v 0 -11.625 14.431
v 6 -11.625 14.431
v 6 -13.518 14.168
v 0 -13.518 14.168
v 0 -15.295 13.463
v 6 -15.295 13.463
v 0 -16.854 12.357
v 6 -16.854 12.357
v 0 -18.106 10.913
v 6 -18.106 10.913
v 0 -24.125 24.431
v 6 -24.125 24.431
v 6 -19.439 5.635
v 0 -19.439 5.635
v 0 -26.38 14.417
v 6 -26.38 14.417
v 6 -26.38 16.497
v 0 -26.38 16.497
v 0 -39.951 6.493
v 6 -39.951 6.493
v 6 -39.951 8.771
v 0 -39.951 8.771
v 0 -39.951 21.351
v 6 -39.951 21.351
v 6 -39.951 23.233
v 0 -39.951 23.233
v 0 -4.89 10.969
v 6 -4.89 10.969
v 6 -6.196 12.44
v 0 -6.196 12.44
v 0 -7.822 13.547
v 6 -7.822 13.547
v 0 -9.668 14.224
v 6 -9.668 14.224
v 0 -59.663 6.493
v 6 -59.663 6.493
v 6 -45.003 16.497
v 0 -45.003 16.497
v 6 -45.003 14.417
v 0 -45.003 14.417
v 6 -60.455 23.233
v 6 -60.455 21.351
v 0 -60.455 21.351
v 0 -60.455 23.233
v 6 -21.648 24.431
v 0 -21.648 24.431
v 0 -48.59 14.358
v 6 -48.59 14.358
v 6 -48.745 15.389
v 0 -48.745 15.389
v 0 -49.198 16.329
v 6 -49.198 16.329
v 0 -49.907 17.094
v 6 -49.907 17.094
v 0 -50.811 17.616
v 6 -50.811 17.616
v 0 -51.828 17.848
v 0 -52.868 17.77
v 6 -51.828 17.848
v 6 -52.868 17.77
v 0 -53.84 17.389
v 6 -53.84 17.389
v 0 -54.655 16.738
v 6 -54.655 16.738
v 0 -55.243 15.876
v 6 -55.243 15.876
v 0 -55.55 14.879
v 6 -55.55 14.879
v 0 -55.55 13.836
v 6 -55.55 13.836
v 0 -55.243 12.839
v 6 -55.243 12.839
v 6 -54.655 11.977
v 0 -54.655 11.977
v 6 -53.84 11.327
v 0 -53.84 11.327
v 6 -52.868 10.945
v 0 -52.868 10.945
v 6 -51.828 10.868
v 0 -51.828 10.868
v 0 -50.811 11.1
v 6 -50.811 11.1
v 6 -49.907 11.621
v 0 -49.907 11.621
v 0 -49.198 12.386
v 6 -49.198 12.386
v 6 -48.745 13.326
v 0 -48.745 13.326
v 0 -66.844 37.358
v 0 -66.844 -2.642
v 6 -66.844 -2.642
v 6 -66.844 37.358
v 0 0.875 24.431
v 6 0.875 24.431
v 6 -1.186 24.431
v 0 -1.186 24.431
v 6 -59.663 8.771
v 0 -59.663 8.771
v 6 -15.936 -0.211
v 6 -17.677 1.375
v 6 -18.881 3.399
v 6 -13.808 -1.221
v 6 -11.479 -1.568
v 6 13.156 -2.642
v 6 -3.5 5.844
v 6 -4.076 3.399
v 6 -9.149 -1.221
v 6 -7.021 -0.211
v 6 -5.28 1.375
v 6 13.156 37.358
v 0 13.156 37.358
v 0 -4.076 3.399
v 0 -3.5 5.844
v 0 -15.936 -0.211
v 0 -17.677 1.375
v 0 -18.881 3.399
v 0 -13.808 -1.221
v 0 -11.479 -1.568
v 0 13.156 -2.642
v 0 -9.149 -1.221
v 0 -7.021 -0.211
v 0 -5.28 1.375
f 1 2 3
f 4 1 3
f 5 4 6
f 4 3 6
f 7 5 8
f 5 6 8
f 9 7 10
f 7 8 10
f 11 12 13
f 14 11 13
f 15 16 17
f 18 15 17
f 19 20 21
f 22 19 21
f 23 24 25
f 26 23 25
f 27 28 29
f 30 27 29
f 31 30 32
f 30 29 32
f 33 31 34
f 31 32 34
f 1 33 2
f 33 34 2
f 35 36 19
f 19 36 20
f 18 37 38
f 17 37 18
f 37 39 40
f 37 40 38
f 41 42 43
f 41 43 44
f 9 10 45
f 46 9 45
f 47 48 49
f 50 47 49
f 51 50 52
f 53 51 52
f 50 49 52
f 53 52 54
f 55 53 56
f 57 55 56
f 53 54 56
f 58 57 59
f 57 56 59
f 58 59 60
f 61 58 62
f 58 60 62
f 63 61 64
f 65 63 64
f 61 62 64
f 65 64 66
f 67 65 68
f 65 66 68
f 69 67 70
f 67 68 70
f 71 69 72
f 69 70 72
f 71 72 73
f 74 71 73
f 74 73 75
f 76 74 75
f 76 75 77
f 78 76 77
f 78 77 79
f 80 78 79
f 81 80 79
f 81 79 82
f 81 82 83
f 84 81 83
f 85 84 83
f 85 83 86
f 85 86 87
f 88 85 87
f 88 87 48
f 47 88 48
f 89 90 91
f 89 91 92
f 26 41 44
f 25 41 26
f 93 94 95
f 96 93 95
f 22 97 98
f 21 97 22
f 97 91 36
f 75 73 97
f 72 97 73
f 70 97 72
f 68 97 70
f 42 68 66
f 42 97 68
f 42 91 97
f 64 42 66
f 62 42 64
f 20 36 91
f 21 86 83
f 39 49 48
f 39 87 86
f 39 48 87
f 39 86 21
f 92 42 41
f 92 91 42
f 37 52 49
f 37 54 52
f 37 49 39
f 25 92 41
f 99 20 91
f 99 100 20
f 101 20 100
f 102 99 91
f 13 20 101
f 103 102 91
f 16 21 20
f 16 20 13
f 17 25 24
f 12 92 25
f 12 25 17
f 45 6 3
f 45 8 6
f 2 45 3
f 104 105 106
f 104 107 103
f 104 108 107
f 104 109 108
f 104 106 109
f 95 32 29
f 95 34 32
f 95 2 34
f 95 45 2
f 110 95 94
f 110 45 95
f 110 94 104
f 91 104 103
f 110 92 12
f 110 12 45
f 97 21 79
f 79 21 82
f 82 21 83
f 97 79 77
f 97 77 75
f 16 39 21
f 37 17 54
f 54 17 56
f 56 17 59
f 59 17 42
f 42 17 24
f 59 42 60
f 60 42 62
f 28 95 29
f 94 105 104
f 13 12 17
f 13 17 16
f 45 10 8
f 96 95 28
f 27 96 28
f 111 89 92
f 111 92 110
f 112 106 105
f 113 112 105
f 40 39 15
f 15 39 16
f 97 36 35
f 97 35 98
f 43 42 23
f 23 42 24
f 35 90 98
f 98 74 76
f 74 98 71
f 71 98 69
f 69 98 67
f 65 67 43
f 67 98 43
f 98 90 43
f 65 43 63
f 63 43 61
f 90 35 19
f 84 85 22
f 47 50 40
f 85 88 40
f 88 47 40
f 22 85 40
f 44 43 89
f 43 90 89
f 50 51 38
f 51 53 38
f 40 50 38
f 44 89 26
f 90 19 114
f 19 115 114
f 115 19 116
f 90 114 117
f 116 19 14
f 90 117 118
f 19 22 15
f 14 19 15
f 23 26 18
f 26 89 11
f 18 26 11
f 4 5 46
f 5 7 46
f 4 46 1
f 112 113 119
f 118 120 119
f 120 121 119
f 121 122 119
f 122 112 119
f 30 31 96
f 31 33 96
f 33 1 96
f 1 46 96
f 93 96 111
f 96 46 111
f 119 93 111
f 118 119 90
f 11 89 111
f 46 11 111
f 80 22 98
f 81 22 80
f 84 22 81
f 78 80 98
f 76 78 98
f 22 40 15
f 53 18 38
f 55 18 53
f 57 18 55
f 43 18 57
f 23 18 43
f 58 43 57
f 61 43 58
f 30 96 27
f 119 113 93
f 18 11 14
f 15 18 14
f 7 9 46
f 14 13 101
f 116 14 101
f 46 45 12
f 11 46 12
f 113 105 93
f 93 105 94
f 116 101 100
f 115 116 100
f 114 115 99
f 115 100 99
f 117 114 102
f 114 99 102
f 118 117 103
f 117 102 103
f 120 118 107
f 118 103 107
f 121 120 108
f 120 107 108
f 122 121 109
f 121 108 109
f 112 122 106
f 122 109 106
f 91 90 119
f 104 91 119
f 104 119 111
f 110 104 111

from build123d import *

# Parameters (mm, degrees)
F0_W     = 80
F0_H     = 40
F1_DEPTH = 6
F2_R     = 3.5
F3_DEPTH = 25
F5_DEPTH = 25
F6_W     = 20.5047205091
F6_H     = 1.8820744008
F6_W_2   = 18.622642383
F6_H_2   = 2.0801890641
F6_W_3   = 19.7122655809
F6_H_3   = 2.2783023305
F7_DEPTH = 25


with BuildPart() as f1:
    # F0 (on Right) → F1 (new body)
    with BuildSketch(Plane.YZ):
        with Locations((-26.8443413079, 17.3577393824)):
            Rectangle(F0_W, F0_H)
    extrude(amount=F1_DEPTH)

    # F2 (on face) → F3 (cut)
    with BuildSketch(Plane.YZ.offset(6)):
        with Locations((-52.0895607769, 14.3577393824)):
            Circle(F2_R)
    extrude(amount=-F3_DEPTH, mode=Mode.SUBTRACT)

    # F4 (on face) → F5 (cut)
    with BuildSketch(Plane.YZ.offset(6)):
        with BuildLine():
            ThreePointArc((-3.5001474581, 5.8439973669), (-3.4839255473, 6.137753605), (-3.478515805, 6.4319076676))
            ThreePointArc((-3.478515805, 6.4319076676), (-3.8394647971, 8.807807434), (-4.8897407299, 10.9693125439))
            ThreePointArc((-4.8897407299, 10.9693125439), (-7.8217234118, 13.5472340406), (-11.6246055812, 14.4305736675))
            ThreePointArc((-11.6246055812, 14.4305736675), (-15.2948749769, 13.4629390764), (-18.1060345681, 10.9125320711))
            ThreePointArc((-18.1060345681, 10.9125320711), (-19.2350505337, 8.3905217189), (-19.4387102983, 5.6348483044))
            Line((-19.4387102983, 5.6348483044), (-18.8812702578, 3.3988849985))
            Line((-18.8812702578, 3.3988849985), (-4.0757613522, 3.3988849985))
            Line((-4.0757613522, 3.3988849985), (-3.5001474581, 5.8439973669))
        make_face()
        with BuildLine():
            ThreePointArc((-18.8812702578, 3.3988849985), (-11.478515805, -1.5680923324), (-4.0757613522, 3.3988849985))
            Line((-4.0757613522, 3.3988849985), (-18.8812702578, 3.3988849985))
        make_face()
        with BuildLine():
            ThreePointArc((-19.4387102983, 5.6348483044), (-19.2350505337, 8.3905217189), (-18.1060345681, 10.9125320711))
            Line((-18.1060345681, 10.9125320711), (-21.6475948691, 24.4305736675))
            Line((-21.6475948691, 24.4305736675), (-24.1246055812, 24.4305736675))
            Line((-24.1246055812, 24.4305736675), (-19.4387102983, 5.6348483044))
        make_face()
        with BuildLine():
            ThreePointArc((-4.8897407299, 10.9693125439), (-3.8394647971, 8.807807434), (-3.478515805, 6.4319076676))
            ThreePointArc((-3.478515805, 6.4319076676), (-3.4839255473, 6.137753605), (-3.5001474581, 5.8439973669))
            Line((-3.5001474581, 5.8439973669), (0.8753944188, 24.4305736675))
            Line((0.8753944188, 24.4305736675), (-1.1863555992, 24.4305736675))
            Line((-1.1863555992, 24.4305736675), (-4.8897407299, 10.9693125439))
        make_face()
    extrude(amount=-F5_DEPTH, mode=Mode.SUBTRACT)

    # F6 (on face) → F7 (cut)
    with BuildSketch(Plane.YZ.offset(6)):
        with Locations((-50.2029955387, 22.2922516987)):
            Rectangle(F6_W, F6_H)
        with Locations((-35.6912026182, 15.4573461041)):
            Rectangle(F6_W_2, F6_H_2)
        with Locations((-49.8067680746, 7.6318744104)):
            Rectangle(F6_W_3, F6_H_3)
    extrude(amount=-F7_DEPTH, mode=Mode.SUBTRACT)


solid = f1.part
